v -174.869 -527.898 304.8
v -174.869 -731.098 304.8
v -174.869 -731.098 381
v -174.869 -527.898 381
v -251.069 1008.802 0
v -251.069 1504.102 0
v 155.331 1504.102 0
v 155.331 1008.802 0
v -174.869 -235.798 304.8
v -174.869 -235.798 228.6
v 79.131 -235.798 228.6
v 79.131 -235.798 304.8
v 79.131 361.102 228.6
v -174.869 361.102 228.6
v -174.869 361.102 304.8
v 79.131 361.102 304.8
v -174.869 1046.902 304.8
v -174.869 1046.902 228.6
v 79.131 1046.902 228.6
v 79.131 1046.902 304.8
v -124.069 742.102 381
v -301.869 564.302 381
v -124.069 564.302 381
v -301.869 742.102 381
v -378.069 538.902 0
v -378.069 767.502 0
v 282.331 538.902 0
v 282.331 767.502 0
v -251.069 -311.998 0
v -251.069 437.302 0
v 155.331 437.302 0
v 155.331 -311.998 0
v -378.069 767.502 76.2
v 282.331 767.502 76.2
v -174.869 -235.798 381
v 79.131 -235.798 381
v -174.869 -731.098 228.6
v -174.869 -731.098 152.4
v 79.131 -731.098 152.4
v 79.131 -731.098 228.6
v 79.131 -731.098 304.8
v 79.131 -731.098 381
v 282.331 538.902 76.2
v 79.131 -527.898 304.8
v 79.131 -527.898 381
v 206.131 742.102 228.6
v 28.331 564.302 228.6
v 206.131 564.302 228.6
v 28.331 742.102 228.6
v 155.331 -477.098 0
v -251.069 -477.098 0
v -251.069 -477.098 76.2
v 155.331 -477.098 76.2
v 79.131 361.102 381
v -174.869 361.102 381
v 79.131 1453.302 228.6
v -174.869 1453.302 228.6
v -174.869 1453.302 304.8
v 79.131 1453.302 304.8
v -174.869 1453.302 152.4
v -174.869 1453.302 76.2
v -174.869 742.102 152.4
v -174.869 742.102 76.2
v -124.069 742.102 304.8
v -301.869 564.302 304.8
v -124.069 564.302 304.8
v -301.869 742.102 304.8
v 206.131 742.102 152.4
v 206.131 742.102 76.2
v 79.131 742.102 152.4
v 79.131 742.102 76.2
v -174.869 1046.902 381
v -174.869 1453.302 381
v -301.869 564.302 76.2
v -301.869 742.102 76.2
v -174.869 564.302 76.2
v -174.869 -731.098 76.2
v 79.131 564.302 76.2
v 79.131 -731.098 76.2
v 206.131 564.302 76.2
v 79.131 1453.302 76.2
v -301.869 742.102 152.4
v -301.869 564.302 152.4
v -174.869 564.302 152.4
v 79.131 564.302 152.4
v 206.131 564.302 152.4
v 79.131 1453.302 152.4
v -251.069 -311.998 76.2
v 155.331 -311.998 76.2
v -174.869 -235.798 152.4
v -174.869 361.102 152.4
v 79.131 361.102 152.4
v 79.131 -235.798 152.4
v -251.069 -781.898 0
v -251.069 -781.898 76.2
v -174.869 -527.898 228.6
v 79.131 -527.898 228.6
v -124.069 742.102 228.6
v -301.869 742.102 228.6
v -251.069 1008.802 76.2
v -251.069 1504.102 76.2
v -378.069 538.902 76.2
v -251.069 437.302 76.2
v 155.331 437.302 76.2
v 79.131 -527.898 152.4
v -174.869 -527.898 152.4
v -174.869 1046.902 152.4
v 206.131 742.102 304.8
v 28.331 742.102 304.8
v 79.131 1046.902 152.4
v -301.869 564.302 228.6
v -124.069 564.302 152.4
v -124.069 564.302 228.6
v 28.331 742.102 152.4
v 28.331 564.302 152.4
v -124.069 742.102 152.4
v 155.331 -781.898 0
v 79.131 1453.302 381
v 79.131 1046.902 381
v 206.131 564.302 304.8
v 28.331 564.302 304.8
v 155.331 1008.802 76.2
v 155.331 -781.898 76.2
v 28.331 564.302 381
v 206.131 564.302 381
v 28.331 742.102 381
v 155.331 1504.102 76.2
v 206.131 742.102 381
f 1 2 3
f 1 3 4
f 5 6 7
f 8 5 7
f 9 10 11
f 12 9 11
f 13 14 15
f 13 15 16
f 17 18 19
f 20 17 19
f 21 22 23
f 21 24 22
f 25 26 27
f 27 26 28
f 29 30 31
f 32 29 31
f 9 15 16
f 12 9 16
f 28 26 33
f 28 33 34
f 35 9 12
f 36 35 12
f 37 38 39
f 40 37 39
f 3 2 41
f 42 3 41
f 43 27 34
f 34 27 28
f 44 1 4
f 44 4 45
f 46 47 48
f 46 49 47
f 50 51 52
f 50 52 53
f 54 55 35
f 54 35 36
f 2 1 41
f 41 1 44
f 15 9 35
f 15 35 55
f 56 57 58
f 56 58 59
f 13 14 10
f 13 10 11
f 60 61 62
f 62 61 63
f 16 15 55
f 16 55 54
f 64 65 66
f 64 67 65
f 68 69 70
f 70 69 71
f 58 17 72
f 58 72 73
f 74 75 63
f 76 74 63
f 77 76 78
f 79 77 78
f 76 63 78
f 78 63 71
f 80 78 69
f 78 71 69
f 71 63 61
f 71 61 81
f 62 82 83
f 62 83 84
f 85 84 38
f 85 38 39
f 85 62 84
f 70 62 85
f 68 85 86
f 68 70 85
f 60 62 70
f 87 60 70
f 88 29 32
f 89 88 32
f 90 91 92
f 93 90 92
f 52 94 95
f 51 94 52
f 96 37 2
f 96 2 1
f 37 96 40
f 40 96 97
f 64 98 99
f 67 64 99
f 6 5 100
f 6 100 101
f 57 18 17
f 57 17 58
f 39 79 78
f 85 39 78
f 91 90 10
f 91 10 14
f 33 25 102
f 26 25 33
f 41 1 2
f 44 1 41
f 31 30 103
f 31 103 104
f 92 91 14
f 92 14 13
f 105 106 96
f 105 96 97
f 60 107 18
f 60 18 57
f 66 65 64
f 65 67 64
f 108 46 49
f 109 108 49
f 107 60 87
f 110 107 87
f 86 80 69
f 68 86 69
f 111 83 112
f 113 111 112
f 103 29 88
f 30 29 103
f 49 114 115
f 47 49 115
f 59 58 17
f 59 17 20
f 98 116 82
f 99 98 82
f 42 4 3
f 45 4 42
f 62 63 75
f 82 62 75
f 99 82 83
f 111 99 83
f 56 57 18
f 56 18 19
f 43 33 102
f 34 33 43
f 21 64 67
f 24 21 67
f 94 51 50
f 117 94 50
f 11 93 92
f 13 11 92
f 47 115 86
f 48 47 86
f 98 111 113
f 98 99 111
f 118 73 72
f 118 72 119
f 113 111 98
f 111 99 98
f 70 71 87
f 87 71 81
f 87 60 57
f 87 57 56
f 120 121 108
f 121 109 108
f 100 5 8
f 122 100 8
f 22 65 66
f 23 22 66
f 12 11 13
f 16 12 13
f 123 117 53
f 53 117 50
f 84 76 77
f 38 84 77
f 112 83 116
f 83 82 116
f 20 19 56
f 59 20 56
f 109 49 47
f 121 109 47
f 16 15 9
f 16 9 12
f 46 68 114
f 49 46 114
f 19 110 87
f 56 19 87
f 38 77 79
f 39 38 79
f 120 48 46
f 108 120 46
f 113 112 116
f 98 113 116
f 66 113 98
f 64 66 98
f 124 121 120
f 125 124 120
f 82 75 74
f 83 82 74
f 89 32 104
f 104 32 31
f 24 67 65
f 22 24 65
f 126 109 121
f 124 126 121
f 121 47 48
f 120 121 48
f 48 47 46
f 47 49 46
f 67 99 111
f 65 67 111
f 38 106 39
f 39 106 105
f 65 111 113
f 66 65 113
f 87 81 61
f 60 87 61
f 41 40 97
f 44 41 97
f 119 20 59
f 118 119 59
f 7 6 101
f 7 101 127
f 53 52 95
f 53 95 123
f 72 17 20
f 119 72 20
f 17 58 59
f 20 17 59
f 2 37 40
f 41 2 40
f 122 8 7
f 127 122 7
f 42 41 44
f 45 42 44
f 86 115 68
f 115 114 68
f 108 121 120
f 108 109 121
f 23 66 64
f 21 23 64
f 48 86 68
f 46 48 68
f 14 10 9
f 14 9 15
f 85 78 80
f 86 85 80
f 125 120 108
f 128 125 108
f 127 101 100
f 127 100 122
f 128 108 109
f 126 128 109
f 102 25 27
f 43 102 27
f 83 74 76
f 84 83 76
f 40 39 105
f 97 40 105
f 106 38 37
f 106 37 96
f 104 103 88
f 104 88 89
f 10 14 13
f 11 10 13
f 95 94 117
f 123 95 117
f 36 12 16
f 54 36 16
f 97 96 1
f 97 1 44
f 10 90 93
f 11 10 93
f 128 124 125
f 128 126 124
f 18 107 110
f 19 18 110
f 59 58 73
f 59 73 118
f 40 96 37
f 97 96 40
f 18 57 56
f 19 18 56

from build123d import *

# Parameters (mm, degrees)
F0_W     = 406.4
F0_H     = 304.8
F1_DEPTH = 76.2
F0_H_2   = 749.3
F0_W_2   = 660.4
F0_H_3   = 228.6
F0_H_4   = 495.3
F2_W     = 254
F2_H     = 254
F3_DEPTH = 76.2
F4_W     = 254
F4_H     = 203.2
F5_DEPTH = 76.2
F4_H_2   = 596.9
F4_H_3   = 406.4
F6_DEPTH = 76.2
F7_DEPTH = 76.2


with BuildPart() as f1:
    # F0 (on Top) → F1 (new body)
    with BuildSketch(Plane.XY):
        with Locations((-47.8693349523, -629.4977704952)):
            Rectangle(F0_W, F0_H)
    extrude(amount=F1_DEPTH)


with BuildPart() as f1b:
    # F0 (on Top) → F1, piece 2 (new body)
    with BuildSketch(Plane.XY):
        with Locations((-47.8693349523, 62.6522295048)):
            Rectangle(F0_W, F0_H_2)
    extrude(amount=F1_DEPTH)


with BuildPart() as f1c:
    # F0 (on Top) → F1, piece 3 (new body)
    with BuildSketch(Plane.XY):
        with Locations((-47.8693349523, 653.2022295048)):
            Rectangle(F0_W_2, F0_H_3)
    extrude(amount=F1_DEPTH)


with BuildPart() as f1d:
    # F0 (on Top) → F1, piece 4 (new body)
    with BuildSketch(Plane.XY):
        with Locations((-47.8693349523, 1256.4522295048)):
            Rectangle(F0_W, F0_H_4)
    extrude(amount=F1_DEPTH)


with BuildPart() as f3:
    # F2 (on face) → F3 (new body)
    with BuildSketch(Plane.XY.offset(76.2)):
        Polygon((-174.8693349523, 564.3022295048), (-174.8693349523, -477.0977704952), (79.1306650477, -477.0977704952), (79.1306650477, 564.3022295048), (206.1306650477, 564.3022295048), (206.1306650477, 742.1022295048), (79.1306650477, 742.1022295048), (79.1306650477, 1453.3022295048), (-174.8693349523, 1453.3022295048), (-174.8693349523, 742.1022295048), (-301.8693349523, 742.1022295048), (-301.8693349523, 564.3022295048), align=None)
        with Locations((-47.8693349523, -604.0977704952)):
            Rectangle(F2_W, F2_H)
    extrude(amount=F3_DEPTH)


with BuildPart() as f5:
    # F4 (on face) → F5 (new body)
    with BuildSketch(Plane.XY.offset(152.4)):
        with Locations((-47.8693349523, -629.4977704952)):
            Rectangle(F4_W, F4_H)
    extrude(amount=F5_DEPTH)


with BuildPart() as f5b:
    # F4 (on face) → F5, piece 2 (new body)
    with BuildSketch(Plane.XY.offset(152.4)):
        with Locations((-47.8693349523, 62.6522295048)):
            Rectangle(F4_W, F4_H_2)
    extrude(amount=F5_DEPTH)


with BuildPart() as f5c:
    # F4 (on face) → F5, piece 3 (new body)
    with BuildSketch(Plane.XY.offset(152.4)):
        Polygon((-301.8693349523, 564.3022295048), (-174.8693349523, 564.3022295048), (-124.0693349523, 564.3022295048), (-124.0693349523, 742.1022295048), (-174.8693349523, 742.1022295048), (-301.8693349523, 742.1022295048), align=None)
    extrude(amount=F5_DEPTH)


with BuildPart() as f5d:
    # F4 (on face) → F5, piece 4 (new body)
    with BuildSketch(Plane.XY.offset(152.4)):
        Polygon((28.3306650477, 564.3022295048), (79.1306650477, 564.3022295048), (206.1306650477, 564.3022295048), (206.1306650477, 742.1022295048), (79.1306650477, 742.1022295048), (28.3306650477, 742.1022295048), align=None)
    extrude(amount=F5_DEPTH)


with BuildPart() as f5e:
    # F4 (on face) → F5, piece 5 (new body)
    with BuildSketch(Plane.XY.offset(152.4)):
        with Locations((-47.8693349523, 1250.1022295048)):
            Rectangle(F4_W, F4_H_3)
    extrude(amount=F5_DEPTH)


with BuildPart() as f6:
    # F6 (new): a face of the model
    f6_faces = [f5.part.faces().sort_by_distance(p)[0] for p in [
        (-47.8693349523, -629.4977704952, 228.6),
    ]]
    extrude(f6_faces, amount=F6_DEPTH)


with BuildPart() as f6b:
    # F6#2 (new): a face of the model
    f6_2_faces = [f5b.part.faces().sort_by_distance(p)[0] for p in [
        (-47.8693349523, 62.6522295048, 228.6),
    ]]
    extrude(f6_2_faces, amount=F6_DEPTH)


with BuildPart() as f6c:
    # F6#3 (new): a face of the model
    f6_3_faces = [f5c.part.faces().sort_by_distance(p)[0] for p in [
        (-212.9693349523, 653.2022295048, 228.6),
    ]]
    extrude(f6_3_faces, amount=F6_DEPTH)


with BuildPart() as f6d:
    # F6#4 (new): a face of the model
    f6_4_faces = [f5d.part.faces().sort_by_distance(p)[0] for p in [
        (117.2306650477, 653.2022295048, 228.6),
    ]]
    extrude(f6_4_faces, amount=F6_DEPTH)


with BuildPart() as f6e:
    # F6#5 (new): a face of the model
    f6_5_faces = [f5e.part.faces().sort_by_distance(p)[0] for p in [
        (-47.8693349523, 1250.1022295048, 228.6),
    ]]
    extrude(f6_5_faces, amount=F6_DEPTH)


with BuildPart() as f7:
    # F7 (new): a face of the model
    f7_faces = [f6.part.faces().sort_by_distance(p)[0] for p in [
        (-47.8693349523, -629.4977704952, 304.8),
    ]]
    extrude(f7_faces, amount=F7_DEPTH)


with BuildPart() as f7b:
    # F7#2 (new): a face of the model
    f7_2_faces = [f6b.part.faces().sort_by_distance(p)[0] for p in [
        (-47.8693349523, 62.6522295048, 304.8),
    ]]
    extrude(f7_2_faces, amount=F7_DEPTH)


with BuildPart() as f7c:
    # F7#3 (new): a face of the model
    f7_3_faces = [f6c.part.faces().sort_by_distance(p)[0] for p in [
        (-212.9693349523, 653.2022295048, 304.8),
    ]]
    extrude(f7_3_faces, amount=F7_DEPTH)


with BuildPart() as f7d:
    # F7#4 (new): a face of the model
    f7_4_faces = [f6d.part.faces().sort_by_distance(p)[0] for p in [
        (117.2306650477, 653.2022295048, 304.8),
    ]]
    extrude(f7_4_faces, amount=F7_DEPTH)


with BuildPart() as f7e:
    # F7#5 (new): a face of the model
    f7_5_faces = [f6e.part.faces().sort_by_distance(p)[0] for p in [
        (-47.8693349523, 1250.1022295048, 304.8),
    ]]
    extrude(f7_5_faces, amount=F7_DEPTH)


solid = Compound([f1.part, f1b.part, f1c.part, f1d.part, f3.part, f5.part, f5b.part, f5c.part, f5d.part, f5e.part, f6.part, f6b.part, f6c.part, f6d.part, f6e.part, f7.part, f7b.part, f7c.part, f7d.part, f7e.part])
